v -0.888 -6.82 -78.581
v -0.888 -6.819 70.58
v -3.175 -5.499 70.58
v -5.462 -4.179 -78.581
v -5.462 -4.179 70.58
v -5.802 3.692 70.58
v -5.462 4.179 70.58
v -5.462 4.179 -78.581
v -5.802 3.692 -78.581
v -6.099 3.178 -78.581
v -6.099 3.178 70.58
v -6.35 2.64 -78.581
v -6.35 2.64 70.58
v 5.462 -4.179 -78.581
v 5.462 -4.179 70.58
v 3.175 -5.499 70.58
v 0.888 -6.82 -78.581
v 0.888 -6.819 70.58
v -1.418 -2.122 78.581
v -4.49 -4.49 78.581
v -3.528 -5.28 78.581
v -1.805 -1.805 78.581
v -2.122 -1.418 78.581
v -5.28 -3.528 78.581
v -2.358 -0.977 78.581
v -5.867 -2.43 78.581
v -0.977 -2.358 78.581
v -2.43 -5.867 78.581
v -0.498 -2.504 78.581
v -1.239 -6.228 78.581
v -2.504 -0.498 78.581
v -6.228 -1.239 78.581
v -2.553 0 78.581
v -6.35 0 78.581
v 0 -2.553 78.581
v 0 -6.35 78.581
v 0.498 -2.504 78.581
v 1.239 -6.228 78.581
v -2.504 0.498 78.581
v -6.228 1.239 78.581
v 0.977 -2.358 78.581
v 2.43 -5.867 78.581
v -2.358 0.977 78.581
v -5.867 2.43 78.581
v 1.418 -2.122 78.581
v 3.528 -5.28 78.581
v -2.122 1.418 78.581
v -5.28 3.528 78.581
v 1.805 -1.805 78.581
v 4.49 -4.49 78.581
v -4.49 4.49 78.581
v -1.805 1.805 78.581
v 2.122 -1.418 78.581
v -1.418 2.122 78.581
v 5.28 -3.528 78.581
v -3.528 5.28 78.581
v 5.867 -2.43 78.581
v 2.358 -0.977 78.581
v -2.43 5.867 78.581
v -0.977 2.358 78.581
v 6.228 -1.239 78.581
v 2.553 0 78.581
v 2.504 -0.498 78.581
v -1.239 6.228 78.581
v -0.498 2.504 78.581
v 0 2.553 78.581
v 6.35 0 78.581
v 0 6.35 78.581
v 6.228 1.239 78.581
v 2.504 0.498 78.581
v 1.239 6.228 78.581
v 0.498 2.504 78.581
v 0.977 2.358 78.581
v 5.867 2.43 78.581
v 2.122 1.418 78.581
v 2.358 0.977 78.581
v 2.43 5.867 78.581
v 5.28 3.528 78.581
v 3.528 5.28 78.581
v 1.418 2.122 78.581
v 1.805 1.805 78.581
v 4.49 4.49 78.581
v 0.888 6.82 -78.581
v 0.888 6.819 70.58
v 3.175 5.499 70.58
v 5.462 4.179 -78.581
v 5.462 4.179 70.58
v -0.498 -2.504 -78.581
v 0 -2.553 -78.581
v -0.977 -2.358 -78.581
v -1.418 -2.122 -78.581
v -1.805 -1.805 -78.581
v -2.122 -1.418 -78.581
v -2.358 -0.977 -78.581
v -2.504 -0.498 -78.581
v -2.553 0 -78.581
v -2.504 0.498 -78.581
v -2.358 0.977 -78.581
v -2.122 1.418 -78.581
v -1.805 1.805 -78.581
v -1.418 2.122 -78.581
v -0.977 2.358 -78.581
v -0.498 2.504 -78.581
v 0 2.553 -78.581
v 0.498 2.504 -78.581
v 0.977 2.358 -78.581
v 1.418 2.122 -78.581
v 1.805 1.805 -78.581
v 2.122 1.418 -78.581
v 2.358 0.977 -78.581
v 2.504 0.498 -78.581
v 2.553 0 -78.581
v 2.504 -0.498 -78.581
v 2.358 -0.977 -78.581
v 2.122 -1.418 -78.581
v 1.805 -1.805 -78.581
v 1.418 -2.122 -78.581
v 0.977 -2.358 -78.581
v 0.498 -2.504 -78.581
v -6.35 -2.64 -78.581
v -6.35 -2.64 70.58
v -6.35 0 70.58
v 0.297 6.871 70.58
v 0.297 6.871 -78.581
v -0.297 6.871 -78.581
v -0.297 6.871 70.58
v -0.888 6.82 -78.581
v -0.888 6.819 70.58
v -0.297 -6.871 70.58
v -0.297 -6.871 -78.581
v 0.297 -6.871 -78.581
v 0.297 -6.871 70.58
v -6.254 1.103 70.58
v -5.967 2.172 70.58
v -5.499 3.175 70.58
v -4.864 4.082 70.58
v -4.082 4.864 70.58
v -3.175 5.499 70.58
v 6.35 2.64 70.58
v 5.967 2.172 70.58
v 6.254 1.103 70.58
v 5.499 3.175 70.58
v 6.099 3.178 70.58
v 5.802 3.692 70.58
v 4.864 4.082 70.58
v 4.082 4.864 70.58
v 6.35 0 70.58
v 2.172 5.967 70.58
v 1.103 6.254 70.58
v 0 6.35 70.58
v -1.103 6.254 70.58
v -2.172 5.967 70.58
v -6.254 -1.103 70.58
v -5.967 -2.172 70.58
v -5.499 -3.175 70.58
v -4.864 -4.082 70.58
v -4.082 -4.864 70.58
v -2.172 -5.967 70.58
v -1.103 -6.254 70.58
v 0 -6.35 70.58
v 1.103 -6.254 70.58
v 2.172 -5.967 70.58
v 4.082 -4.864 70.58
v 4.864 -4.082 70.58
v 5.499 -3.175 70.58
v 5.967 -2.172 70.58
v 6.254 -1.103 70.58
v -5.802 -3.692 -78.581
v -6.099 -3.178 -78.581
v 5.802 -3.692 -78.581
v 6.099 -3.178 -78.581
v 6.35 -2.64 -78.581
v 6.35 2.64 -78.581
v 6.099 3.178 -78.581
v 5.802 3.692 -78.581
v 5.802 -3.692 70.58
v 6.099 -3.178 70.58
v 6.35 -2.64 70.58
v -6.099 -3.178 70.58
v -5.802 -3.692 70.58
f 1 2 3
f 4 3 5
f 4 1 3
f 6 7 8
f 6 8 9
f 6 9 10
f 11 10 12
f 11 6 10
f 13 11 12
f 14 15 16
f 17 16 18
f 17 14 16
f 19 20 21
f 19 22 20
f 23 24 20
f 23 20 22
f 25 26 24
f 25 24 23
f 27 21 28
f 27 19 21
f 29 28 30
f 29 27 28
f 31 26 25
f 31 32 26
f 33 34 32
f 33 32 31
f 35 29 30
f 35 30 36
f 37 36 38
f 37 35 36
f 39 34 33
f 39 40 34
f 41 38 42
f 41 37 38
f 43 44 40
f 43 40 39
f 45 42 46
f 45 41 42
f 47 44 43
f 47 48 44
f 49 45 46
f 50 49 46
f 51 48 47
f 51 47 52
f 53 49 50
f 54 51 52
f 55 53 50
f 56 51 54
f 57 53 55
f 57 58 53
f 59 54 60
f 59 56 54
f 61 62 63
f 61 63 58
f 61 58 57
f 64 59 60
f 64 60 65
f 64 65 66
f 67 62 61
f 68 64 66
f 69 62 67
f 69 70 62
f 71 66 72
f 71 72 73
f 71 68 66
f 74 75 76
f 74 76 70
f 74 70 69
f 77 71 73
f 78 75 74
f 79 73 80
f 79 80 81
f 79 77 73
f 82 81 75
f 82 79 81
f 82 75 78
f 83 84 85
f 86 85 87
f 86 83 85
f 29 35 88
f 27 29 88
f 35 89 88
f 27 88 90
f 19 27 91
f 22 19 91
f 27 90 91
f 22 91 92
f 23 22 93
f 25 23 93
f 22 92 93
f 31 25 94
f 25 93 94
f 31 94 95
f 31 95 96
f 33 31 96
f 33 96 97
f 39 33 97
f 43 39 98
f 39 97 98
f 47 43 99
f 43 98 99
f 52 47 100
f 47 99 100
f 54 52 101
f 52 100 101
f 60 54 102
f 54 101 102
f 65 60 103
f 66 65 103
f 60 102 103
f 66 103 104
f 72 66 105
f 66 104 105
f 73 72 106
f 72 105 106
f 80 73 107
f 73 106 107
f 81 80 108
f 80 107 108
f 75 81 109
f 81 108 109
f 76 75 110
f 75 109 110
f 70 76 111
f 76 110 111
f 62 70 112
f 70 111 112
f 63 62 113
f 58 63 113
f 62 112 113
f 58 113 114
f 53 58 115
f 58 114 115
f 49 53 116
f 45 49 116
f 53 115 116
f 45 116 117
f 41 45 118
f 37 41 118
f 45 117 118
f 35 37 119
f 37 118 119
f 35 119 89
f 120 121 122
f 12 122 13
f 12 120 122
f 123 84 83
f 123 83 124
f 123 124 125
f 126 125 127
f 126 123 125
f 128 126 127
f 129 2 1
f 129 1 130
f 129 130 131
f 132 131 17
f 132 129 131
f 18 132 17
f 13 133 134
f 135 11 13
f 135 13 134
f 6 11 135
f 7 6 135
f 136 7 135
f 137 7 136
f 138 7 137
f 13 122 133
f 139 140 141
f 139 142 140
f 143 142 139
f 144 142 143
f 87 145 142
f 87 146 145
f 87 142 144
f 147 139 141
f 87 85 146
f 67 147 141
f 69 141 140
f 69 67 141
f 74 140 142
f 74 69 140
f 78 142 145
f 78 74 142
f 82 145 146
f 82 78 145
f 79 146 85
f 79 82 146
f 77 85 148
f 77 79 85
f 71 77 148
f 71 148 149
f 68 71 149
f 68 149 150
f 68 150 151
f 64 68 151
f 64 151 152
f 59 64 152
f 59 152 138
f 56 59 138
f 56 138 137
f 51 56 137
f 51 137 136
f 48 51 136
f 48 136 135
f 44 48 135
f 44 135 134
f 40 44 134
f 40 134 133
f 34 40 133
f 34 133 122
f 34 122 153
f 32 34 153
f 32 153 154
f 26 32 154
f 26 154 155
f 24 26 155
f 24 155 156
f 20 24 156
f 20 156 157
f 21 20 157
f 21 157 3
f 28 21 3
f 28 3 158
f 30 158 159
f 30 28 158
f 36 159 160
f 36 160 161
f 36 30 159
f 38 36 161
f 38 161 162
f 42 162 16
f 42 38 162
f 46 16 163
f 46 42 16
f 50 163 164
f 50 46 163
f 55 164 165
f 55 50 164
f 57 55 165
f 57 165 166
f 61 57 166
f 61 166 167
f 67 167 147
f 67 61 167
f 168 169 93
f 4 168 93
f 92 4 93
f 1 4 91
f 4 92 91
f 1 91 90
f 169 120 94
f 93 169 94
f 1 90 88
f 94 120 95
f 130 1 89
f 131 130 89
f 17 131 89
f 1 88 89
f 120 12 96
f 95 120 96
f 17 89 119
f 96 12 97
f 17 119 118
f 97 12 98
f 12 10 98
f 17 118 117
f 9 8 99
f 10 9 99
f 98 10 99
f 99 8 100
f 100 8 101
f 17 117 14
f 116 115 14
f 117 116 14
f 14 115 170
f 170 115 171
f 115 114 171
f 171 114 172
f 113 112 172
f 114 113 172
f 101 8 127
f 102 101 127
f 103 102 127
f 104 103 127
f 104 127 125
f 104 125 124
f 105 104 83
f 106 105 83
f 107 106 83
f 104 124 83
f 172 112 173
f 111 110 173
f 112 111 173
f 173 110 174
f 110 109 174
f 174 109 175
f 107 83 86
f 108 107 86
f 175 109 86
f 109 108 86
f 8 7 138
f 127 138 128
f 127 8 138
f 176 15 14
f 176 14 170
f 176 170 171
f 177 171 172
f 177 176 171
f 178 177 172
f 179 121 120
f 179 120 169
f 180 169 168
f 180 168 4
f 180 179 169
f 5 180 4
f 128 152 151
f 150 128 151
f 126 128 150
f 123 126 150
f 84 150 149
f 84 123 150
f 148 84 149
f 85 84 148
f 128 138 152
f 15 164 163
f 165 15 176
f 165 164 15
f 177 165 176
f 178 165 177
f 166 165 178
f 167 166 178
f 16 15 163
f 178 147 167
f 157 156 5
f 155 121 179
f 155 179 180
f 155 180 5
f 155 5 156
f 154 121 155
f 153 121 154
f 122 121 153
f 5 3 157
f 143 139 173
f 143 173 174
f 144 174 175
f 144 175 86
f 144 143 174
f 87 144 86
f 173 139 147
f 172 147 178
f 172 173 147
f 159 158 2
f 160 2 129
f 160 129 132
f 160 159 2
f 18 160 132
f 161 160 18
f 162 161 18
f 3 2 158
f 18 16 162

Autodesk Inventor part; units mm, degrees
ref_plane "YZ Plane" through (0, 0, 0) normal (1, 0, 0) x (0, 1, 0)
ref_plane "XZ Plane" through (0, 0, 0) normal (0, 1, 0) x (-1, 0, 0)
ref_plane "XY Plane" through (0, 0, 0) normal (0, 0, 1) x (1, 0, 0)
sketch "Sketch1" plane through (0, 0, 0) normal (0, 0, 1) x (1, 0, 0)
  line L0 (-6.35, -3.6662) -> (-6.35, 3.6662)
  line L1 (-6.35, 3.6662) -> (0, 7.3323)
  line L2 (0, 7.3323) -> (6.35, 3.6662)
  line L3 (6.35, 3.6662) -> (6.35, -3.6662)
  line L4 (6.35, -3.6662) -> (0, -7.3323)
  line L5 (0, -7.3323) -> (-6.35, -3.6662)
  point P0 (0, 0)
  point P1 (0, 0)
  dimension "Size" = 12.7
extrude "Extrusion1" add sketch "Sketch1" along normal mid plane 157.1625
sketch "Sketch3" plane through (0, 0, 78.5812) normal (0, 0, 1) x (1, 0, 0)
  line L0 (-6.35, 3.6662) -> (0, 7.3323) construction
  line L1 (0, 7.3323) -> (6.35, 3.6662) construction
  line L2 (6.35, 3.6662) -> (6.35, -3.6662) construction
  line L3 (6.35, -3.6662) -> (0, -7.3323) construction
  line L4 (0, -7.3323) -> (-6.35, -3.6662) construction
  line L5 (-6.35, -3.6662) -> (-6.35, 3.6662) construction
  point P0 (0, 0)
hole "Hole1" at (0, 0, 78.5812) direction (0, 0, -1) diameter 5.1054 end through all
sketch "Sketch4" plane through (0, 0, 78.5812) normal (0, 0, 1) x (1, 0, 0)
  circle A0 centre (0, 0) radius 2.5527 construction
  line L0 (-6.35, 3.6662) -> (0, 7.3323) construction
  line L1 (0, 7.3323) -> (6.35, 3.6662) construction
  line L2 (6.35, 3.6662) -> (6.35, -3.6662) construction
  line L3 (6.35, -3.6662) -> (0, -7.3323) construction
  line L4 (0, -7.3323) -> (-6.35, -3.6662) construction
  line L5 (-6.35, -3.6662) -> (-6.35, 3.6662) construction
  circle A1 centre (0, 0) radius 6.8771
  circle A2 centre (0, 0) radius 8.89
  dimension "thunder" = 13.7541
  dimension "d16" = 17.78
extrude "Extrusion3" cut sketch "Sketch4" against normal through all
sketch "Sketch5" plane through (0, 0, 78.5812) normal (0, 0, 1) x (1, 0, 0)
  circle A0 centre (0, 0) radius 6.35
  arc A1 (5.4616, -4.1791) -> (6.35, -2.6403) centre (0, 0) ccw projected
  line L0 (6.35, -2.6403) -> (6.35, 2.6403) projected
  arc A2 (6.35, 2.6403) -> (5.4616, 4.1791) centre (0, 0) ccw projected
  line L1 (5.4616, 4.1791) -> (0.8884, 6.8194) projected
  arc A3 (0.8884, 6.8194) -> (-0.8884, 6.8194) centre (0, 0) ccw projected
  line L2 (-0.8884, 6.8194) -> (-5.4616, 4.1791) projected
  arc A4 (-5.4616, 4.1791) -> (-6.35, 2.6403) centre (0, 0) ccw projected
  line L3 (-6.35, 2.6403) -> (-6.35, -2.6403) projected
  arc A5 (-6.35, -2.6403) -> (-5.4616, -4.1791) centre (0, 0) ccw projected
  line L4 (-5.4616, -4.1791) -> (-0.8884, -6.8194) projected
  arc A6 (-0.8884, -6.8194) -> (0.8884, -6.8194) centre (0, 0) ccw projected
  line L5 (0.8884, -6.8194) -> (5.4616, -4.1791) projected
  circle A7 centre (0, 0) radius 2.5527 construction
  point P0 (3.175, -5.4993)
  point P1 (-3.175, -5.4993)
  point P2 (-6.35, 0)
  point P3 (-3.175, 5.4993)
  point P4 (3.175, 5.4993)
  point P5 (6.35, 0)
  dimension "d19" = 12.7
extrude "Extrusion4" cut sketch "Sketch5" against normal blind 8.001 contours L0 A1 L5 A0 | A0 L1 A2 L0 | A0 L2 A3 L1 | L5 A6 L4 A0 | A0 L3 A4 L2 | L4 A5 L3 A0
equation "\"bearing\" = 25.4"
properties part number "GP5-009" material "Aluminum 6061"
